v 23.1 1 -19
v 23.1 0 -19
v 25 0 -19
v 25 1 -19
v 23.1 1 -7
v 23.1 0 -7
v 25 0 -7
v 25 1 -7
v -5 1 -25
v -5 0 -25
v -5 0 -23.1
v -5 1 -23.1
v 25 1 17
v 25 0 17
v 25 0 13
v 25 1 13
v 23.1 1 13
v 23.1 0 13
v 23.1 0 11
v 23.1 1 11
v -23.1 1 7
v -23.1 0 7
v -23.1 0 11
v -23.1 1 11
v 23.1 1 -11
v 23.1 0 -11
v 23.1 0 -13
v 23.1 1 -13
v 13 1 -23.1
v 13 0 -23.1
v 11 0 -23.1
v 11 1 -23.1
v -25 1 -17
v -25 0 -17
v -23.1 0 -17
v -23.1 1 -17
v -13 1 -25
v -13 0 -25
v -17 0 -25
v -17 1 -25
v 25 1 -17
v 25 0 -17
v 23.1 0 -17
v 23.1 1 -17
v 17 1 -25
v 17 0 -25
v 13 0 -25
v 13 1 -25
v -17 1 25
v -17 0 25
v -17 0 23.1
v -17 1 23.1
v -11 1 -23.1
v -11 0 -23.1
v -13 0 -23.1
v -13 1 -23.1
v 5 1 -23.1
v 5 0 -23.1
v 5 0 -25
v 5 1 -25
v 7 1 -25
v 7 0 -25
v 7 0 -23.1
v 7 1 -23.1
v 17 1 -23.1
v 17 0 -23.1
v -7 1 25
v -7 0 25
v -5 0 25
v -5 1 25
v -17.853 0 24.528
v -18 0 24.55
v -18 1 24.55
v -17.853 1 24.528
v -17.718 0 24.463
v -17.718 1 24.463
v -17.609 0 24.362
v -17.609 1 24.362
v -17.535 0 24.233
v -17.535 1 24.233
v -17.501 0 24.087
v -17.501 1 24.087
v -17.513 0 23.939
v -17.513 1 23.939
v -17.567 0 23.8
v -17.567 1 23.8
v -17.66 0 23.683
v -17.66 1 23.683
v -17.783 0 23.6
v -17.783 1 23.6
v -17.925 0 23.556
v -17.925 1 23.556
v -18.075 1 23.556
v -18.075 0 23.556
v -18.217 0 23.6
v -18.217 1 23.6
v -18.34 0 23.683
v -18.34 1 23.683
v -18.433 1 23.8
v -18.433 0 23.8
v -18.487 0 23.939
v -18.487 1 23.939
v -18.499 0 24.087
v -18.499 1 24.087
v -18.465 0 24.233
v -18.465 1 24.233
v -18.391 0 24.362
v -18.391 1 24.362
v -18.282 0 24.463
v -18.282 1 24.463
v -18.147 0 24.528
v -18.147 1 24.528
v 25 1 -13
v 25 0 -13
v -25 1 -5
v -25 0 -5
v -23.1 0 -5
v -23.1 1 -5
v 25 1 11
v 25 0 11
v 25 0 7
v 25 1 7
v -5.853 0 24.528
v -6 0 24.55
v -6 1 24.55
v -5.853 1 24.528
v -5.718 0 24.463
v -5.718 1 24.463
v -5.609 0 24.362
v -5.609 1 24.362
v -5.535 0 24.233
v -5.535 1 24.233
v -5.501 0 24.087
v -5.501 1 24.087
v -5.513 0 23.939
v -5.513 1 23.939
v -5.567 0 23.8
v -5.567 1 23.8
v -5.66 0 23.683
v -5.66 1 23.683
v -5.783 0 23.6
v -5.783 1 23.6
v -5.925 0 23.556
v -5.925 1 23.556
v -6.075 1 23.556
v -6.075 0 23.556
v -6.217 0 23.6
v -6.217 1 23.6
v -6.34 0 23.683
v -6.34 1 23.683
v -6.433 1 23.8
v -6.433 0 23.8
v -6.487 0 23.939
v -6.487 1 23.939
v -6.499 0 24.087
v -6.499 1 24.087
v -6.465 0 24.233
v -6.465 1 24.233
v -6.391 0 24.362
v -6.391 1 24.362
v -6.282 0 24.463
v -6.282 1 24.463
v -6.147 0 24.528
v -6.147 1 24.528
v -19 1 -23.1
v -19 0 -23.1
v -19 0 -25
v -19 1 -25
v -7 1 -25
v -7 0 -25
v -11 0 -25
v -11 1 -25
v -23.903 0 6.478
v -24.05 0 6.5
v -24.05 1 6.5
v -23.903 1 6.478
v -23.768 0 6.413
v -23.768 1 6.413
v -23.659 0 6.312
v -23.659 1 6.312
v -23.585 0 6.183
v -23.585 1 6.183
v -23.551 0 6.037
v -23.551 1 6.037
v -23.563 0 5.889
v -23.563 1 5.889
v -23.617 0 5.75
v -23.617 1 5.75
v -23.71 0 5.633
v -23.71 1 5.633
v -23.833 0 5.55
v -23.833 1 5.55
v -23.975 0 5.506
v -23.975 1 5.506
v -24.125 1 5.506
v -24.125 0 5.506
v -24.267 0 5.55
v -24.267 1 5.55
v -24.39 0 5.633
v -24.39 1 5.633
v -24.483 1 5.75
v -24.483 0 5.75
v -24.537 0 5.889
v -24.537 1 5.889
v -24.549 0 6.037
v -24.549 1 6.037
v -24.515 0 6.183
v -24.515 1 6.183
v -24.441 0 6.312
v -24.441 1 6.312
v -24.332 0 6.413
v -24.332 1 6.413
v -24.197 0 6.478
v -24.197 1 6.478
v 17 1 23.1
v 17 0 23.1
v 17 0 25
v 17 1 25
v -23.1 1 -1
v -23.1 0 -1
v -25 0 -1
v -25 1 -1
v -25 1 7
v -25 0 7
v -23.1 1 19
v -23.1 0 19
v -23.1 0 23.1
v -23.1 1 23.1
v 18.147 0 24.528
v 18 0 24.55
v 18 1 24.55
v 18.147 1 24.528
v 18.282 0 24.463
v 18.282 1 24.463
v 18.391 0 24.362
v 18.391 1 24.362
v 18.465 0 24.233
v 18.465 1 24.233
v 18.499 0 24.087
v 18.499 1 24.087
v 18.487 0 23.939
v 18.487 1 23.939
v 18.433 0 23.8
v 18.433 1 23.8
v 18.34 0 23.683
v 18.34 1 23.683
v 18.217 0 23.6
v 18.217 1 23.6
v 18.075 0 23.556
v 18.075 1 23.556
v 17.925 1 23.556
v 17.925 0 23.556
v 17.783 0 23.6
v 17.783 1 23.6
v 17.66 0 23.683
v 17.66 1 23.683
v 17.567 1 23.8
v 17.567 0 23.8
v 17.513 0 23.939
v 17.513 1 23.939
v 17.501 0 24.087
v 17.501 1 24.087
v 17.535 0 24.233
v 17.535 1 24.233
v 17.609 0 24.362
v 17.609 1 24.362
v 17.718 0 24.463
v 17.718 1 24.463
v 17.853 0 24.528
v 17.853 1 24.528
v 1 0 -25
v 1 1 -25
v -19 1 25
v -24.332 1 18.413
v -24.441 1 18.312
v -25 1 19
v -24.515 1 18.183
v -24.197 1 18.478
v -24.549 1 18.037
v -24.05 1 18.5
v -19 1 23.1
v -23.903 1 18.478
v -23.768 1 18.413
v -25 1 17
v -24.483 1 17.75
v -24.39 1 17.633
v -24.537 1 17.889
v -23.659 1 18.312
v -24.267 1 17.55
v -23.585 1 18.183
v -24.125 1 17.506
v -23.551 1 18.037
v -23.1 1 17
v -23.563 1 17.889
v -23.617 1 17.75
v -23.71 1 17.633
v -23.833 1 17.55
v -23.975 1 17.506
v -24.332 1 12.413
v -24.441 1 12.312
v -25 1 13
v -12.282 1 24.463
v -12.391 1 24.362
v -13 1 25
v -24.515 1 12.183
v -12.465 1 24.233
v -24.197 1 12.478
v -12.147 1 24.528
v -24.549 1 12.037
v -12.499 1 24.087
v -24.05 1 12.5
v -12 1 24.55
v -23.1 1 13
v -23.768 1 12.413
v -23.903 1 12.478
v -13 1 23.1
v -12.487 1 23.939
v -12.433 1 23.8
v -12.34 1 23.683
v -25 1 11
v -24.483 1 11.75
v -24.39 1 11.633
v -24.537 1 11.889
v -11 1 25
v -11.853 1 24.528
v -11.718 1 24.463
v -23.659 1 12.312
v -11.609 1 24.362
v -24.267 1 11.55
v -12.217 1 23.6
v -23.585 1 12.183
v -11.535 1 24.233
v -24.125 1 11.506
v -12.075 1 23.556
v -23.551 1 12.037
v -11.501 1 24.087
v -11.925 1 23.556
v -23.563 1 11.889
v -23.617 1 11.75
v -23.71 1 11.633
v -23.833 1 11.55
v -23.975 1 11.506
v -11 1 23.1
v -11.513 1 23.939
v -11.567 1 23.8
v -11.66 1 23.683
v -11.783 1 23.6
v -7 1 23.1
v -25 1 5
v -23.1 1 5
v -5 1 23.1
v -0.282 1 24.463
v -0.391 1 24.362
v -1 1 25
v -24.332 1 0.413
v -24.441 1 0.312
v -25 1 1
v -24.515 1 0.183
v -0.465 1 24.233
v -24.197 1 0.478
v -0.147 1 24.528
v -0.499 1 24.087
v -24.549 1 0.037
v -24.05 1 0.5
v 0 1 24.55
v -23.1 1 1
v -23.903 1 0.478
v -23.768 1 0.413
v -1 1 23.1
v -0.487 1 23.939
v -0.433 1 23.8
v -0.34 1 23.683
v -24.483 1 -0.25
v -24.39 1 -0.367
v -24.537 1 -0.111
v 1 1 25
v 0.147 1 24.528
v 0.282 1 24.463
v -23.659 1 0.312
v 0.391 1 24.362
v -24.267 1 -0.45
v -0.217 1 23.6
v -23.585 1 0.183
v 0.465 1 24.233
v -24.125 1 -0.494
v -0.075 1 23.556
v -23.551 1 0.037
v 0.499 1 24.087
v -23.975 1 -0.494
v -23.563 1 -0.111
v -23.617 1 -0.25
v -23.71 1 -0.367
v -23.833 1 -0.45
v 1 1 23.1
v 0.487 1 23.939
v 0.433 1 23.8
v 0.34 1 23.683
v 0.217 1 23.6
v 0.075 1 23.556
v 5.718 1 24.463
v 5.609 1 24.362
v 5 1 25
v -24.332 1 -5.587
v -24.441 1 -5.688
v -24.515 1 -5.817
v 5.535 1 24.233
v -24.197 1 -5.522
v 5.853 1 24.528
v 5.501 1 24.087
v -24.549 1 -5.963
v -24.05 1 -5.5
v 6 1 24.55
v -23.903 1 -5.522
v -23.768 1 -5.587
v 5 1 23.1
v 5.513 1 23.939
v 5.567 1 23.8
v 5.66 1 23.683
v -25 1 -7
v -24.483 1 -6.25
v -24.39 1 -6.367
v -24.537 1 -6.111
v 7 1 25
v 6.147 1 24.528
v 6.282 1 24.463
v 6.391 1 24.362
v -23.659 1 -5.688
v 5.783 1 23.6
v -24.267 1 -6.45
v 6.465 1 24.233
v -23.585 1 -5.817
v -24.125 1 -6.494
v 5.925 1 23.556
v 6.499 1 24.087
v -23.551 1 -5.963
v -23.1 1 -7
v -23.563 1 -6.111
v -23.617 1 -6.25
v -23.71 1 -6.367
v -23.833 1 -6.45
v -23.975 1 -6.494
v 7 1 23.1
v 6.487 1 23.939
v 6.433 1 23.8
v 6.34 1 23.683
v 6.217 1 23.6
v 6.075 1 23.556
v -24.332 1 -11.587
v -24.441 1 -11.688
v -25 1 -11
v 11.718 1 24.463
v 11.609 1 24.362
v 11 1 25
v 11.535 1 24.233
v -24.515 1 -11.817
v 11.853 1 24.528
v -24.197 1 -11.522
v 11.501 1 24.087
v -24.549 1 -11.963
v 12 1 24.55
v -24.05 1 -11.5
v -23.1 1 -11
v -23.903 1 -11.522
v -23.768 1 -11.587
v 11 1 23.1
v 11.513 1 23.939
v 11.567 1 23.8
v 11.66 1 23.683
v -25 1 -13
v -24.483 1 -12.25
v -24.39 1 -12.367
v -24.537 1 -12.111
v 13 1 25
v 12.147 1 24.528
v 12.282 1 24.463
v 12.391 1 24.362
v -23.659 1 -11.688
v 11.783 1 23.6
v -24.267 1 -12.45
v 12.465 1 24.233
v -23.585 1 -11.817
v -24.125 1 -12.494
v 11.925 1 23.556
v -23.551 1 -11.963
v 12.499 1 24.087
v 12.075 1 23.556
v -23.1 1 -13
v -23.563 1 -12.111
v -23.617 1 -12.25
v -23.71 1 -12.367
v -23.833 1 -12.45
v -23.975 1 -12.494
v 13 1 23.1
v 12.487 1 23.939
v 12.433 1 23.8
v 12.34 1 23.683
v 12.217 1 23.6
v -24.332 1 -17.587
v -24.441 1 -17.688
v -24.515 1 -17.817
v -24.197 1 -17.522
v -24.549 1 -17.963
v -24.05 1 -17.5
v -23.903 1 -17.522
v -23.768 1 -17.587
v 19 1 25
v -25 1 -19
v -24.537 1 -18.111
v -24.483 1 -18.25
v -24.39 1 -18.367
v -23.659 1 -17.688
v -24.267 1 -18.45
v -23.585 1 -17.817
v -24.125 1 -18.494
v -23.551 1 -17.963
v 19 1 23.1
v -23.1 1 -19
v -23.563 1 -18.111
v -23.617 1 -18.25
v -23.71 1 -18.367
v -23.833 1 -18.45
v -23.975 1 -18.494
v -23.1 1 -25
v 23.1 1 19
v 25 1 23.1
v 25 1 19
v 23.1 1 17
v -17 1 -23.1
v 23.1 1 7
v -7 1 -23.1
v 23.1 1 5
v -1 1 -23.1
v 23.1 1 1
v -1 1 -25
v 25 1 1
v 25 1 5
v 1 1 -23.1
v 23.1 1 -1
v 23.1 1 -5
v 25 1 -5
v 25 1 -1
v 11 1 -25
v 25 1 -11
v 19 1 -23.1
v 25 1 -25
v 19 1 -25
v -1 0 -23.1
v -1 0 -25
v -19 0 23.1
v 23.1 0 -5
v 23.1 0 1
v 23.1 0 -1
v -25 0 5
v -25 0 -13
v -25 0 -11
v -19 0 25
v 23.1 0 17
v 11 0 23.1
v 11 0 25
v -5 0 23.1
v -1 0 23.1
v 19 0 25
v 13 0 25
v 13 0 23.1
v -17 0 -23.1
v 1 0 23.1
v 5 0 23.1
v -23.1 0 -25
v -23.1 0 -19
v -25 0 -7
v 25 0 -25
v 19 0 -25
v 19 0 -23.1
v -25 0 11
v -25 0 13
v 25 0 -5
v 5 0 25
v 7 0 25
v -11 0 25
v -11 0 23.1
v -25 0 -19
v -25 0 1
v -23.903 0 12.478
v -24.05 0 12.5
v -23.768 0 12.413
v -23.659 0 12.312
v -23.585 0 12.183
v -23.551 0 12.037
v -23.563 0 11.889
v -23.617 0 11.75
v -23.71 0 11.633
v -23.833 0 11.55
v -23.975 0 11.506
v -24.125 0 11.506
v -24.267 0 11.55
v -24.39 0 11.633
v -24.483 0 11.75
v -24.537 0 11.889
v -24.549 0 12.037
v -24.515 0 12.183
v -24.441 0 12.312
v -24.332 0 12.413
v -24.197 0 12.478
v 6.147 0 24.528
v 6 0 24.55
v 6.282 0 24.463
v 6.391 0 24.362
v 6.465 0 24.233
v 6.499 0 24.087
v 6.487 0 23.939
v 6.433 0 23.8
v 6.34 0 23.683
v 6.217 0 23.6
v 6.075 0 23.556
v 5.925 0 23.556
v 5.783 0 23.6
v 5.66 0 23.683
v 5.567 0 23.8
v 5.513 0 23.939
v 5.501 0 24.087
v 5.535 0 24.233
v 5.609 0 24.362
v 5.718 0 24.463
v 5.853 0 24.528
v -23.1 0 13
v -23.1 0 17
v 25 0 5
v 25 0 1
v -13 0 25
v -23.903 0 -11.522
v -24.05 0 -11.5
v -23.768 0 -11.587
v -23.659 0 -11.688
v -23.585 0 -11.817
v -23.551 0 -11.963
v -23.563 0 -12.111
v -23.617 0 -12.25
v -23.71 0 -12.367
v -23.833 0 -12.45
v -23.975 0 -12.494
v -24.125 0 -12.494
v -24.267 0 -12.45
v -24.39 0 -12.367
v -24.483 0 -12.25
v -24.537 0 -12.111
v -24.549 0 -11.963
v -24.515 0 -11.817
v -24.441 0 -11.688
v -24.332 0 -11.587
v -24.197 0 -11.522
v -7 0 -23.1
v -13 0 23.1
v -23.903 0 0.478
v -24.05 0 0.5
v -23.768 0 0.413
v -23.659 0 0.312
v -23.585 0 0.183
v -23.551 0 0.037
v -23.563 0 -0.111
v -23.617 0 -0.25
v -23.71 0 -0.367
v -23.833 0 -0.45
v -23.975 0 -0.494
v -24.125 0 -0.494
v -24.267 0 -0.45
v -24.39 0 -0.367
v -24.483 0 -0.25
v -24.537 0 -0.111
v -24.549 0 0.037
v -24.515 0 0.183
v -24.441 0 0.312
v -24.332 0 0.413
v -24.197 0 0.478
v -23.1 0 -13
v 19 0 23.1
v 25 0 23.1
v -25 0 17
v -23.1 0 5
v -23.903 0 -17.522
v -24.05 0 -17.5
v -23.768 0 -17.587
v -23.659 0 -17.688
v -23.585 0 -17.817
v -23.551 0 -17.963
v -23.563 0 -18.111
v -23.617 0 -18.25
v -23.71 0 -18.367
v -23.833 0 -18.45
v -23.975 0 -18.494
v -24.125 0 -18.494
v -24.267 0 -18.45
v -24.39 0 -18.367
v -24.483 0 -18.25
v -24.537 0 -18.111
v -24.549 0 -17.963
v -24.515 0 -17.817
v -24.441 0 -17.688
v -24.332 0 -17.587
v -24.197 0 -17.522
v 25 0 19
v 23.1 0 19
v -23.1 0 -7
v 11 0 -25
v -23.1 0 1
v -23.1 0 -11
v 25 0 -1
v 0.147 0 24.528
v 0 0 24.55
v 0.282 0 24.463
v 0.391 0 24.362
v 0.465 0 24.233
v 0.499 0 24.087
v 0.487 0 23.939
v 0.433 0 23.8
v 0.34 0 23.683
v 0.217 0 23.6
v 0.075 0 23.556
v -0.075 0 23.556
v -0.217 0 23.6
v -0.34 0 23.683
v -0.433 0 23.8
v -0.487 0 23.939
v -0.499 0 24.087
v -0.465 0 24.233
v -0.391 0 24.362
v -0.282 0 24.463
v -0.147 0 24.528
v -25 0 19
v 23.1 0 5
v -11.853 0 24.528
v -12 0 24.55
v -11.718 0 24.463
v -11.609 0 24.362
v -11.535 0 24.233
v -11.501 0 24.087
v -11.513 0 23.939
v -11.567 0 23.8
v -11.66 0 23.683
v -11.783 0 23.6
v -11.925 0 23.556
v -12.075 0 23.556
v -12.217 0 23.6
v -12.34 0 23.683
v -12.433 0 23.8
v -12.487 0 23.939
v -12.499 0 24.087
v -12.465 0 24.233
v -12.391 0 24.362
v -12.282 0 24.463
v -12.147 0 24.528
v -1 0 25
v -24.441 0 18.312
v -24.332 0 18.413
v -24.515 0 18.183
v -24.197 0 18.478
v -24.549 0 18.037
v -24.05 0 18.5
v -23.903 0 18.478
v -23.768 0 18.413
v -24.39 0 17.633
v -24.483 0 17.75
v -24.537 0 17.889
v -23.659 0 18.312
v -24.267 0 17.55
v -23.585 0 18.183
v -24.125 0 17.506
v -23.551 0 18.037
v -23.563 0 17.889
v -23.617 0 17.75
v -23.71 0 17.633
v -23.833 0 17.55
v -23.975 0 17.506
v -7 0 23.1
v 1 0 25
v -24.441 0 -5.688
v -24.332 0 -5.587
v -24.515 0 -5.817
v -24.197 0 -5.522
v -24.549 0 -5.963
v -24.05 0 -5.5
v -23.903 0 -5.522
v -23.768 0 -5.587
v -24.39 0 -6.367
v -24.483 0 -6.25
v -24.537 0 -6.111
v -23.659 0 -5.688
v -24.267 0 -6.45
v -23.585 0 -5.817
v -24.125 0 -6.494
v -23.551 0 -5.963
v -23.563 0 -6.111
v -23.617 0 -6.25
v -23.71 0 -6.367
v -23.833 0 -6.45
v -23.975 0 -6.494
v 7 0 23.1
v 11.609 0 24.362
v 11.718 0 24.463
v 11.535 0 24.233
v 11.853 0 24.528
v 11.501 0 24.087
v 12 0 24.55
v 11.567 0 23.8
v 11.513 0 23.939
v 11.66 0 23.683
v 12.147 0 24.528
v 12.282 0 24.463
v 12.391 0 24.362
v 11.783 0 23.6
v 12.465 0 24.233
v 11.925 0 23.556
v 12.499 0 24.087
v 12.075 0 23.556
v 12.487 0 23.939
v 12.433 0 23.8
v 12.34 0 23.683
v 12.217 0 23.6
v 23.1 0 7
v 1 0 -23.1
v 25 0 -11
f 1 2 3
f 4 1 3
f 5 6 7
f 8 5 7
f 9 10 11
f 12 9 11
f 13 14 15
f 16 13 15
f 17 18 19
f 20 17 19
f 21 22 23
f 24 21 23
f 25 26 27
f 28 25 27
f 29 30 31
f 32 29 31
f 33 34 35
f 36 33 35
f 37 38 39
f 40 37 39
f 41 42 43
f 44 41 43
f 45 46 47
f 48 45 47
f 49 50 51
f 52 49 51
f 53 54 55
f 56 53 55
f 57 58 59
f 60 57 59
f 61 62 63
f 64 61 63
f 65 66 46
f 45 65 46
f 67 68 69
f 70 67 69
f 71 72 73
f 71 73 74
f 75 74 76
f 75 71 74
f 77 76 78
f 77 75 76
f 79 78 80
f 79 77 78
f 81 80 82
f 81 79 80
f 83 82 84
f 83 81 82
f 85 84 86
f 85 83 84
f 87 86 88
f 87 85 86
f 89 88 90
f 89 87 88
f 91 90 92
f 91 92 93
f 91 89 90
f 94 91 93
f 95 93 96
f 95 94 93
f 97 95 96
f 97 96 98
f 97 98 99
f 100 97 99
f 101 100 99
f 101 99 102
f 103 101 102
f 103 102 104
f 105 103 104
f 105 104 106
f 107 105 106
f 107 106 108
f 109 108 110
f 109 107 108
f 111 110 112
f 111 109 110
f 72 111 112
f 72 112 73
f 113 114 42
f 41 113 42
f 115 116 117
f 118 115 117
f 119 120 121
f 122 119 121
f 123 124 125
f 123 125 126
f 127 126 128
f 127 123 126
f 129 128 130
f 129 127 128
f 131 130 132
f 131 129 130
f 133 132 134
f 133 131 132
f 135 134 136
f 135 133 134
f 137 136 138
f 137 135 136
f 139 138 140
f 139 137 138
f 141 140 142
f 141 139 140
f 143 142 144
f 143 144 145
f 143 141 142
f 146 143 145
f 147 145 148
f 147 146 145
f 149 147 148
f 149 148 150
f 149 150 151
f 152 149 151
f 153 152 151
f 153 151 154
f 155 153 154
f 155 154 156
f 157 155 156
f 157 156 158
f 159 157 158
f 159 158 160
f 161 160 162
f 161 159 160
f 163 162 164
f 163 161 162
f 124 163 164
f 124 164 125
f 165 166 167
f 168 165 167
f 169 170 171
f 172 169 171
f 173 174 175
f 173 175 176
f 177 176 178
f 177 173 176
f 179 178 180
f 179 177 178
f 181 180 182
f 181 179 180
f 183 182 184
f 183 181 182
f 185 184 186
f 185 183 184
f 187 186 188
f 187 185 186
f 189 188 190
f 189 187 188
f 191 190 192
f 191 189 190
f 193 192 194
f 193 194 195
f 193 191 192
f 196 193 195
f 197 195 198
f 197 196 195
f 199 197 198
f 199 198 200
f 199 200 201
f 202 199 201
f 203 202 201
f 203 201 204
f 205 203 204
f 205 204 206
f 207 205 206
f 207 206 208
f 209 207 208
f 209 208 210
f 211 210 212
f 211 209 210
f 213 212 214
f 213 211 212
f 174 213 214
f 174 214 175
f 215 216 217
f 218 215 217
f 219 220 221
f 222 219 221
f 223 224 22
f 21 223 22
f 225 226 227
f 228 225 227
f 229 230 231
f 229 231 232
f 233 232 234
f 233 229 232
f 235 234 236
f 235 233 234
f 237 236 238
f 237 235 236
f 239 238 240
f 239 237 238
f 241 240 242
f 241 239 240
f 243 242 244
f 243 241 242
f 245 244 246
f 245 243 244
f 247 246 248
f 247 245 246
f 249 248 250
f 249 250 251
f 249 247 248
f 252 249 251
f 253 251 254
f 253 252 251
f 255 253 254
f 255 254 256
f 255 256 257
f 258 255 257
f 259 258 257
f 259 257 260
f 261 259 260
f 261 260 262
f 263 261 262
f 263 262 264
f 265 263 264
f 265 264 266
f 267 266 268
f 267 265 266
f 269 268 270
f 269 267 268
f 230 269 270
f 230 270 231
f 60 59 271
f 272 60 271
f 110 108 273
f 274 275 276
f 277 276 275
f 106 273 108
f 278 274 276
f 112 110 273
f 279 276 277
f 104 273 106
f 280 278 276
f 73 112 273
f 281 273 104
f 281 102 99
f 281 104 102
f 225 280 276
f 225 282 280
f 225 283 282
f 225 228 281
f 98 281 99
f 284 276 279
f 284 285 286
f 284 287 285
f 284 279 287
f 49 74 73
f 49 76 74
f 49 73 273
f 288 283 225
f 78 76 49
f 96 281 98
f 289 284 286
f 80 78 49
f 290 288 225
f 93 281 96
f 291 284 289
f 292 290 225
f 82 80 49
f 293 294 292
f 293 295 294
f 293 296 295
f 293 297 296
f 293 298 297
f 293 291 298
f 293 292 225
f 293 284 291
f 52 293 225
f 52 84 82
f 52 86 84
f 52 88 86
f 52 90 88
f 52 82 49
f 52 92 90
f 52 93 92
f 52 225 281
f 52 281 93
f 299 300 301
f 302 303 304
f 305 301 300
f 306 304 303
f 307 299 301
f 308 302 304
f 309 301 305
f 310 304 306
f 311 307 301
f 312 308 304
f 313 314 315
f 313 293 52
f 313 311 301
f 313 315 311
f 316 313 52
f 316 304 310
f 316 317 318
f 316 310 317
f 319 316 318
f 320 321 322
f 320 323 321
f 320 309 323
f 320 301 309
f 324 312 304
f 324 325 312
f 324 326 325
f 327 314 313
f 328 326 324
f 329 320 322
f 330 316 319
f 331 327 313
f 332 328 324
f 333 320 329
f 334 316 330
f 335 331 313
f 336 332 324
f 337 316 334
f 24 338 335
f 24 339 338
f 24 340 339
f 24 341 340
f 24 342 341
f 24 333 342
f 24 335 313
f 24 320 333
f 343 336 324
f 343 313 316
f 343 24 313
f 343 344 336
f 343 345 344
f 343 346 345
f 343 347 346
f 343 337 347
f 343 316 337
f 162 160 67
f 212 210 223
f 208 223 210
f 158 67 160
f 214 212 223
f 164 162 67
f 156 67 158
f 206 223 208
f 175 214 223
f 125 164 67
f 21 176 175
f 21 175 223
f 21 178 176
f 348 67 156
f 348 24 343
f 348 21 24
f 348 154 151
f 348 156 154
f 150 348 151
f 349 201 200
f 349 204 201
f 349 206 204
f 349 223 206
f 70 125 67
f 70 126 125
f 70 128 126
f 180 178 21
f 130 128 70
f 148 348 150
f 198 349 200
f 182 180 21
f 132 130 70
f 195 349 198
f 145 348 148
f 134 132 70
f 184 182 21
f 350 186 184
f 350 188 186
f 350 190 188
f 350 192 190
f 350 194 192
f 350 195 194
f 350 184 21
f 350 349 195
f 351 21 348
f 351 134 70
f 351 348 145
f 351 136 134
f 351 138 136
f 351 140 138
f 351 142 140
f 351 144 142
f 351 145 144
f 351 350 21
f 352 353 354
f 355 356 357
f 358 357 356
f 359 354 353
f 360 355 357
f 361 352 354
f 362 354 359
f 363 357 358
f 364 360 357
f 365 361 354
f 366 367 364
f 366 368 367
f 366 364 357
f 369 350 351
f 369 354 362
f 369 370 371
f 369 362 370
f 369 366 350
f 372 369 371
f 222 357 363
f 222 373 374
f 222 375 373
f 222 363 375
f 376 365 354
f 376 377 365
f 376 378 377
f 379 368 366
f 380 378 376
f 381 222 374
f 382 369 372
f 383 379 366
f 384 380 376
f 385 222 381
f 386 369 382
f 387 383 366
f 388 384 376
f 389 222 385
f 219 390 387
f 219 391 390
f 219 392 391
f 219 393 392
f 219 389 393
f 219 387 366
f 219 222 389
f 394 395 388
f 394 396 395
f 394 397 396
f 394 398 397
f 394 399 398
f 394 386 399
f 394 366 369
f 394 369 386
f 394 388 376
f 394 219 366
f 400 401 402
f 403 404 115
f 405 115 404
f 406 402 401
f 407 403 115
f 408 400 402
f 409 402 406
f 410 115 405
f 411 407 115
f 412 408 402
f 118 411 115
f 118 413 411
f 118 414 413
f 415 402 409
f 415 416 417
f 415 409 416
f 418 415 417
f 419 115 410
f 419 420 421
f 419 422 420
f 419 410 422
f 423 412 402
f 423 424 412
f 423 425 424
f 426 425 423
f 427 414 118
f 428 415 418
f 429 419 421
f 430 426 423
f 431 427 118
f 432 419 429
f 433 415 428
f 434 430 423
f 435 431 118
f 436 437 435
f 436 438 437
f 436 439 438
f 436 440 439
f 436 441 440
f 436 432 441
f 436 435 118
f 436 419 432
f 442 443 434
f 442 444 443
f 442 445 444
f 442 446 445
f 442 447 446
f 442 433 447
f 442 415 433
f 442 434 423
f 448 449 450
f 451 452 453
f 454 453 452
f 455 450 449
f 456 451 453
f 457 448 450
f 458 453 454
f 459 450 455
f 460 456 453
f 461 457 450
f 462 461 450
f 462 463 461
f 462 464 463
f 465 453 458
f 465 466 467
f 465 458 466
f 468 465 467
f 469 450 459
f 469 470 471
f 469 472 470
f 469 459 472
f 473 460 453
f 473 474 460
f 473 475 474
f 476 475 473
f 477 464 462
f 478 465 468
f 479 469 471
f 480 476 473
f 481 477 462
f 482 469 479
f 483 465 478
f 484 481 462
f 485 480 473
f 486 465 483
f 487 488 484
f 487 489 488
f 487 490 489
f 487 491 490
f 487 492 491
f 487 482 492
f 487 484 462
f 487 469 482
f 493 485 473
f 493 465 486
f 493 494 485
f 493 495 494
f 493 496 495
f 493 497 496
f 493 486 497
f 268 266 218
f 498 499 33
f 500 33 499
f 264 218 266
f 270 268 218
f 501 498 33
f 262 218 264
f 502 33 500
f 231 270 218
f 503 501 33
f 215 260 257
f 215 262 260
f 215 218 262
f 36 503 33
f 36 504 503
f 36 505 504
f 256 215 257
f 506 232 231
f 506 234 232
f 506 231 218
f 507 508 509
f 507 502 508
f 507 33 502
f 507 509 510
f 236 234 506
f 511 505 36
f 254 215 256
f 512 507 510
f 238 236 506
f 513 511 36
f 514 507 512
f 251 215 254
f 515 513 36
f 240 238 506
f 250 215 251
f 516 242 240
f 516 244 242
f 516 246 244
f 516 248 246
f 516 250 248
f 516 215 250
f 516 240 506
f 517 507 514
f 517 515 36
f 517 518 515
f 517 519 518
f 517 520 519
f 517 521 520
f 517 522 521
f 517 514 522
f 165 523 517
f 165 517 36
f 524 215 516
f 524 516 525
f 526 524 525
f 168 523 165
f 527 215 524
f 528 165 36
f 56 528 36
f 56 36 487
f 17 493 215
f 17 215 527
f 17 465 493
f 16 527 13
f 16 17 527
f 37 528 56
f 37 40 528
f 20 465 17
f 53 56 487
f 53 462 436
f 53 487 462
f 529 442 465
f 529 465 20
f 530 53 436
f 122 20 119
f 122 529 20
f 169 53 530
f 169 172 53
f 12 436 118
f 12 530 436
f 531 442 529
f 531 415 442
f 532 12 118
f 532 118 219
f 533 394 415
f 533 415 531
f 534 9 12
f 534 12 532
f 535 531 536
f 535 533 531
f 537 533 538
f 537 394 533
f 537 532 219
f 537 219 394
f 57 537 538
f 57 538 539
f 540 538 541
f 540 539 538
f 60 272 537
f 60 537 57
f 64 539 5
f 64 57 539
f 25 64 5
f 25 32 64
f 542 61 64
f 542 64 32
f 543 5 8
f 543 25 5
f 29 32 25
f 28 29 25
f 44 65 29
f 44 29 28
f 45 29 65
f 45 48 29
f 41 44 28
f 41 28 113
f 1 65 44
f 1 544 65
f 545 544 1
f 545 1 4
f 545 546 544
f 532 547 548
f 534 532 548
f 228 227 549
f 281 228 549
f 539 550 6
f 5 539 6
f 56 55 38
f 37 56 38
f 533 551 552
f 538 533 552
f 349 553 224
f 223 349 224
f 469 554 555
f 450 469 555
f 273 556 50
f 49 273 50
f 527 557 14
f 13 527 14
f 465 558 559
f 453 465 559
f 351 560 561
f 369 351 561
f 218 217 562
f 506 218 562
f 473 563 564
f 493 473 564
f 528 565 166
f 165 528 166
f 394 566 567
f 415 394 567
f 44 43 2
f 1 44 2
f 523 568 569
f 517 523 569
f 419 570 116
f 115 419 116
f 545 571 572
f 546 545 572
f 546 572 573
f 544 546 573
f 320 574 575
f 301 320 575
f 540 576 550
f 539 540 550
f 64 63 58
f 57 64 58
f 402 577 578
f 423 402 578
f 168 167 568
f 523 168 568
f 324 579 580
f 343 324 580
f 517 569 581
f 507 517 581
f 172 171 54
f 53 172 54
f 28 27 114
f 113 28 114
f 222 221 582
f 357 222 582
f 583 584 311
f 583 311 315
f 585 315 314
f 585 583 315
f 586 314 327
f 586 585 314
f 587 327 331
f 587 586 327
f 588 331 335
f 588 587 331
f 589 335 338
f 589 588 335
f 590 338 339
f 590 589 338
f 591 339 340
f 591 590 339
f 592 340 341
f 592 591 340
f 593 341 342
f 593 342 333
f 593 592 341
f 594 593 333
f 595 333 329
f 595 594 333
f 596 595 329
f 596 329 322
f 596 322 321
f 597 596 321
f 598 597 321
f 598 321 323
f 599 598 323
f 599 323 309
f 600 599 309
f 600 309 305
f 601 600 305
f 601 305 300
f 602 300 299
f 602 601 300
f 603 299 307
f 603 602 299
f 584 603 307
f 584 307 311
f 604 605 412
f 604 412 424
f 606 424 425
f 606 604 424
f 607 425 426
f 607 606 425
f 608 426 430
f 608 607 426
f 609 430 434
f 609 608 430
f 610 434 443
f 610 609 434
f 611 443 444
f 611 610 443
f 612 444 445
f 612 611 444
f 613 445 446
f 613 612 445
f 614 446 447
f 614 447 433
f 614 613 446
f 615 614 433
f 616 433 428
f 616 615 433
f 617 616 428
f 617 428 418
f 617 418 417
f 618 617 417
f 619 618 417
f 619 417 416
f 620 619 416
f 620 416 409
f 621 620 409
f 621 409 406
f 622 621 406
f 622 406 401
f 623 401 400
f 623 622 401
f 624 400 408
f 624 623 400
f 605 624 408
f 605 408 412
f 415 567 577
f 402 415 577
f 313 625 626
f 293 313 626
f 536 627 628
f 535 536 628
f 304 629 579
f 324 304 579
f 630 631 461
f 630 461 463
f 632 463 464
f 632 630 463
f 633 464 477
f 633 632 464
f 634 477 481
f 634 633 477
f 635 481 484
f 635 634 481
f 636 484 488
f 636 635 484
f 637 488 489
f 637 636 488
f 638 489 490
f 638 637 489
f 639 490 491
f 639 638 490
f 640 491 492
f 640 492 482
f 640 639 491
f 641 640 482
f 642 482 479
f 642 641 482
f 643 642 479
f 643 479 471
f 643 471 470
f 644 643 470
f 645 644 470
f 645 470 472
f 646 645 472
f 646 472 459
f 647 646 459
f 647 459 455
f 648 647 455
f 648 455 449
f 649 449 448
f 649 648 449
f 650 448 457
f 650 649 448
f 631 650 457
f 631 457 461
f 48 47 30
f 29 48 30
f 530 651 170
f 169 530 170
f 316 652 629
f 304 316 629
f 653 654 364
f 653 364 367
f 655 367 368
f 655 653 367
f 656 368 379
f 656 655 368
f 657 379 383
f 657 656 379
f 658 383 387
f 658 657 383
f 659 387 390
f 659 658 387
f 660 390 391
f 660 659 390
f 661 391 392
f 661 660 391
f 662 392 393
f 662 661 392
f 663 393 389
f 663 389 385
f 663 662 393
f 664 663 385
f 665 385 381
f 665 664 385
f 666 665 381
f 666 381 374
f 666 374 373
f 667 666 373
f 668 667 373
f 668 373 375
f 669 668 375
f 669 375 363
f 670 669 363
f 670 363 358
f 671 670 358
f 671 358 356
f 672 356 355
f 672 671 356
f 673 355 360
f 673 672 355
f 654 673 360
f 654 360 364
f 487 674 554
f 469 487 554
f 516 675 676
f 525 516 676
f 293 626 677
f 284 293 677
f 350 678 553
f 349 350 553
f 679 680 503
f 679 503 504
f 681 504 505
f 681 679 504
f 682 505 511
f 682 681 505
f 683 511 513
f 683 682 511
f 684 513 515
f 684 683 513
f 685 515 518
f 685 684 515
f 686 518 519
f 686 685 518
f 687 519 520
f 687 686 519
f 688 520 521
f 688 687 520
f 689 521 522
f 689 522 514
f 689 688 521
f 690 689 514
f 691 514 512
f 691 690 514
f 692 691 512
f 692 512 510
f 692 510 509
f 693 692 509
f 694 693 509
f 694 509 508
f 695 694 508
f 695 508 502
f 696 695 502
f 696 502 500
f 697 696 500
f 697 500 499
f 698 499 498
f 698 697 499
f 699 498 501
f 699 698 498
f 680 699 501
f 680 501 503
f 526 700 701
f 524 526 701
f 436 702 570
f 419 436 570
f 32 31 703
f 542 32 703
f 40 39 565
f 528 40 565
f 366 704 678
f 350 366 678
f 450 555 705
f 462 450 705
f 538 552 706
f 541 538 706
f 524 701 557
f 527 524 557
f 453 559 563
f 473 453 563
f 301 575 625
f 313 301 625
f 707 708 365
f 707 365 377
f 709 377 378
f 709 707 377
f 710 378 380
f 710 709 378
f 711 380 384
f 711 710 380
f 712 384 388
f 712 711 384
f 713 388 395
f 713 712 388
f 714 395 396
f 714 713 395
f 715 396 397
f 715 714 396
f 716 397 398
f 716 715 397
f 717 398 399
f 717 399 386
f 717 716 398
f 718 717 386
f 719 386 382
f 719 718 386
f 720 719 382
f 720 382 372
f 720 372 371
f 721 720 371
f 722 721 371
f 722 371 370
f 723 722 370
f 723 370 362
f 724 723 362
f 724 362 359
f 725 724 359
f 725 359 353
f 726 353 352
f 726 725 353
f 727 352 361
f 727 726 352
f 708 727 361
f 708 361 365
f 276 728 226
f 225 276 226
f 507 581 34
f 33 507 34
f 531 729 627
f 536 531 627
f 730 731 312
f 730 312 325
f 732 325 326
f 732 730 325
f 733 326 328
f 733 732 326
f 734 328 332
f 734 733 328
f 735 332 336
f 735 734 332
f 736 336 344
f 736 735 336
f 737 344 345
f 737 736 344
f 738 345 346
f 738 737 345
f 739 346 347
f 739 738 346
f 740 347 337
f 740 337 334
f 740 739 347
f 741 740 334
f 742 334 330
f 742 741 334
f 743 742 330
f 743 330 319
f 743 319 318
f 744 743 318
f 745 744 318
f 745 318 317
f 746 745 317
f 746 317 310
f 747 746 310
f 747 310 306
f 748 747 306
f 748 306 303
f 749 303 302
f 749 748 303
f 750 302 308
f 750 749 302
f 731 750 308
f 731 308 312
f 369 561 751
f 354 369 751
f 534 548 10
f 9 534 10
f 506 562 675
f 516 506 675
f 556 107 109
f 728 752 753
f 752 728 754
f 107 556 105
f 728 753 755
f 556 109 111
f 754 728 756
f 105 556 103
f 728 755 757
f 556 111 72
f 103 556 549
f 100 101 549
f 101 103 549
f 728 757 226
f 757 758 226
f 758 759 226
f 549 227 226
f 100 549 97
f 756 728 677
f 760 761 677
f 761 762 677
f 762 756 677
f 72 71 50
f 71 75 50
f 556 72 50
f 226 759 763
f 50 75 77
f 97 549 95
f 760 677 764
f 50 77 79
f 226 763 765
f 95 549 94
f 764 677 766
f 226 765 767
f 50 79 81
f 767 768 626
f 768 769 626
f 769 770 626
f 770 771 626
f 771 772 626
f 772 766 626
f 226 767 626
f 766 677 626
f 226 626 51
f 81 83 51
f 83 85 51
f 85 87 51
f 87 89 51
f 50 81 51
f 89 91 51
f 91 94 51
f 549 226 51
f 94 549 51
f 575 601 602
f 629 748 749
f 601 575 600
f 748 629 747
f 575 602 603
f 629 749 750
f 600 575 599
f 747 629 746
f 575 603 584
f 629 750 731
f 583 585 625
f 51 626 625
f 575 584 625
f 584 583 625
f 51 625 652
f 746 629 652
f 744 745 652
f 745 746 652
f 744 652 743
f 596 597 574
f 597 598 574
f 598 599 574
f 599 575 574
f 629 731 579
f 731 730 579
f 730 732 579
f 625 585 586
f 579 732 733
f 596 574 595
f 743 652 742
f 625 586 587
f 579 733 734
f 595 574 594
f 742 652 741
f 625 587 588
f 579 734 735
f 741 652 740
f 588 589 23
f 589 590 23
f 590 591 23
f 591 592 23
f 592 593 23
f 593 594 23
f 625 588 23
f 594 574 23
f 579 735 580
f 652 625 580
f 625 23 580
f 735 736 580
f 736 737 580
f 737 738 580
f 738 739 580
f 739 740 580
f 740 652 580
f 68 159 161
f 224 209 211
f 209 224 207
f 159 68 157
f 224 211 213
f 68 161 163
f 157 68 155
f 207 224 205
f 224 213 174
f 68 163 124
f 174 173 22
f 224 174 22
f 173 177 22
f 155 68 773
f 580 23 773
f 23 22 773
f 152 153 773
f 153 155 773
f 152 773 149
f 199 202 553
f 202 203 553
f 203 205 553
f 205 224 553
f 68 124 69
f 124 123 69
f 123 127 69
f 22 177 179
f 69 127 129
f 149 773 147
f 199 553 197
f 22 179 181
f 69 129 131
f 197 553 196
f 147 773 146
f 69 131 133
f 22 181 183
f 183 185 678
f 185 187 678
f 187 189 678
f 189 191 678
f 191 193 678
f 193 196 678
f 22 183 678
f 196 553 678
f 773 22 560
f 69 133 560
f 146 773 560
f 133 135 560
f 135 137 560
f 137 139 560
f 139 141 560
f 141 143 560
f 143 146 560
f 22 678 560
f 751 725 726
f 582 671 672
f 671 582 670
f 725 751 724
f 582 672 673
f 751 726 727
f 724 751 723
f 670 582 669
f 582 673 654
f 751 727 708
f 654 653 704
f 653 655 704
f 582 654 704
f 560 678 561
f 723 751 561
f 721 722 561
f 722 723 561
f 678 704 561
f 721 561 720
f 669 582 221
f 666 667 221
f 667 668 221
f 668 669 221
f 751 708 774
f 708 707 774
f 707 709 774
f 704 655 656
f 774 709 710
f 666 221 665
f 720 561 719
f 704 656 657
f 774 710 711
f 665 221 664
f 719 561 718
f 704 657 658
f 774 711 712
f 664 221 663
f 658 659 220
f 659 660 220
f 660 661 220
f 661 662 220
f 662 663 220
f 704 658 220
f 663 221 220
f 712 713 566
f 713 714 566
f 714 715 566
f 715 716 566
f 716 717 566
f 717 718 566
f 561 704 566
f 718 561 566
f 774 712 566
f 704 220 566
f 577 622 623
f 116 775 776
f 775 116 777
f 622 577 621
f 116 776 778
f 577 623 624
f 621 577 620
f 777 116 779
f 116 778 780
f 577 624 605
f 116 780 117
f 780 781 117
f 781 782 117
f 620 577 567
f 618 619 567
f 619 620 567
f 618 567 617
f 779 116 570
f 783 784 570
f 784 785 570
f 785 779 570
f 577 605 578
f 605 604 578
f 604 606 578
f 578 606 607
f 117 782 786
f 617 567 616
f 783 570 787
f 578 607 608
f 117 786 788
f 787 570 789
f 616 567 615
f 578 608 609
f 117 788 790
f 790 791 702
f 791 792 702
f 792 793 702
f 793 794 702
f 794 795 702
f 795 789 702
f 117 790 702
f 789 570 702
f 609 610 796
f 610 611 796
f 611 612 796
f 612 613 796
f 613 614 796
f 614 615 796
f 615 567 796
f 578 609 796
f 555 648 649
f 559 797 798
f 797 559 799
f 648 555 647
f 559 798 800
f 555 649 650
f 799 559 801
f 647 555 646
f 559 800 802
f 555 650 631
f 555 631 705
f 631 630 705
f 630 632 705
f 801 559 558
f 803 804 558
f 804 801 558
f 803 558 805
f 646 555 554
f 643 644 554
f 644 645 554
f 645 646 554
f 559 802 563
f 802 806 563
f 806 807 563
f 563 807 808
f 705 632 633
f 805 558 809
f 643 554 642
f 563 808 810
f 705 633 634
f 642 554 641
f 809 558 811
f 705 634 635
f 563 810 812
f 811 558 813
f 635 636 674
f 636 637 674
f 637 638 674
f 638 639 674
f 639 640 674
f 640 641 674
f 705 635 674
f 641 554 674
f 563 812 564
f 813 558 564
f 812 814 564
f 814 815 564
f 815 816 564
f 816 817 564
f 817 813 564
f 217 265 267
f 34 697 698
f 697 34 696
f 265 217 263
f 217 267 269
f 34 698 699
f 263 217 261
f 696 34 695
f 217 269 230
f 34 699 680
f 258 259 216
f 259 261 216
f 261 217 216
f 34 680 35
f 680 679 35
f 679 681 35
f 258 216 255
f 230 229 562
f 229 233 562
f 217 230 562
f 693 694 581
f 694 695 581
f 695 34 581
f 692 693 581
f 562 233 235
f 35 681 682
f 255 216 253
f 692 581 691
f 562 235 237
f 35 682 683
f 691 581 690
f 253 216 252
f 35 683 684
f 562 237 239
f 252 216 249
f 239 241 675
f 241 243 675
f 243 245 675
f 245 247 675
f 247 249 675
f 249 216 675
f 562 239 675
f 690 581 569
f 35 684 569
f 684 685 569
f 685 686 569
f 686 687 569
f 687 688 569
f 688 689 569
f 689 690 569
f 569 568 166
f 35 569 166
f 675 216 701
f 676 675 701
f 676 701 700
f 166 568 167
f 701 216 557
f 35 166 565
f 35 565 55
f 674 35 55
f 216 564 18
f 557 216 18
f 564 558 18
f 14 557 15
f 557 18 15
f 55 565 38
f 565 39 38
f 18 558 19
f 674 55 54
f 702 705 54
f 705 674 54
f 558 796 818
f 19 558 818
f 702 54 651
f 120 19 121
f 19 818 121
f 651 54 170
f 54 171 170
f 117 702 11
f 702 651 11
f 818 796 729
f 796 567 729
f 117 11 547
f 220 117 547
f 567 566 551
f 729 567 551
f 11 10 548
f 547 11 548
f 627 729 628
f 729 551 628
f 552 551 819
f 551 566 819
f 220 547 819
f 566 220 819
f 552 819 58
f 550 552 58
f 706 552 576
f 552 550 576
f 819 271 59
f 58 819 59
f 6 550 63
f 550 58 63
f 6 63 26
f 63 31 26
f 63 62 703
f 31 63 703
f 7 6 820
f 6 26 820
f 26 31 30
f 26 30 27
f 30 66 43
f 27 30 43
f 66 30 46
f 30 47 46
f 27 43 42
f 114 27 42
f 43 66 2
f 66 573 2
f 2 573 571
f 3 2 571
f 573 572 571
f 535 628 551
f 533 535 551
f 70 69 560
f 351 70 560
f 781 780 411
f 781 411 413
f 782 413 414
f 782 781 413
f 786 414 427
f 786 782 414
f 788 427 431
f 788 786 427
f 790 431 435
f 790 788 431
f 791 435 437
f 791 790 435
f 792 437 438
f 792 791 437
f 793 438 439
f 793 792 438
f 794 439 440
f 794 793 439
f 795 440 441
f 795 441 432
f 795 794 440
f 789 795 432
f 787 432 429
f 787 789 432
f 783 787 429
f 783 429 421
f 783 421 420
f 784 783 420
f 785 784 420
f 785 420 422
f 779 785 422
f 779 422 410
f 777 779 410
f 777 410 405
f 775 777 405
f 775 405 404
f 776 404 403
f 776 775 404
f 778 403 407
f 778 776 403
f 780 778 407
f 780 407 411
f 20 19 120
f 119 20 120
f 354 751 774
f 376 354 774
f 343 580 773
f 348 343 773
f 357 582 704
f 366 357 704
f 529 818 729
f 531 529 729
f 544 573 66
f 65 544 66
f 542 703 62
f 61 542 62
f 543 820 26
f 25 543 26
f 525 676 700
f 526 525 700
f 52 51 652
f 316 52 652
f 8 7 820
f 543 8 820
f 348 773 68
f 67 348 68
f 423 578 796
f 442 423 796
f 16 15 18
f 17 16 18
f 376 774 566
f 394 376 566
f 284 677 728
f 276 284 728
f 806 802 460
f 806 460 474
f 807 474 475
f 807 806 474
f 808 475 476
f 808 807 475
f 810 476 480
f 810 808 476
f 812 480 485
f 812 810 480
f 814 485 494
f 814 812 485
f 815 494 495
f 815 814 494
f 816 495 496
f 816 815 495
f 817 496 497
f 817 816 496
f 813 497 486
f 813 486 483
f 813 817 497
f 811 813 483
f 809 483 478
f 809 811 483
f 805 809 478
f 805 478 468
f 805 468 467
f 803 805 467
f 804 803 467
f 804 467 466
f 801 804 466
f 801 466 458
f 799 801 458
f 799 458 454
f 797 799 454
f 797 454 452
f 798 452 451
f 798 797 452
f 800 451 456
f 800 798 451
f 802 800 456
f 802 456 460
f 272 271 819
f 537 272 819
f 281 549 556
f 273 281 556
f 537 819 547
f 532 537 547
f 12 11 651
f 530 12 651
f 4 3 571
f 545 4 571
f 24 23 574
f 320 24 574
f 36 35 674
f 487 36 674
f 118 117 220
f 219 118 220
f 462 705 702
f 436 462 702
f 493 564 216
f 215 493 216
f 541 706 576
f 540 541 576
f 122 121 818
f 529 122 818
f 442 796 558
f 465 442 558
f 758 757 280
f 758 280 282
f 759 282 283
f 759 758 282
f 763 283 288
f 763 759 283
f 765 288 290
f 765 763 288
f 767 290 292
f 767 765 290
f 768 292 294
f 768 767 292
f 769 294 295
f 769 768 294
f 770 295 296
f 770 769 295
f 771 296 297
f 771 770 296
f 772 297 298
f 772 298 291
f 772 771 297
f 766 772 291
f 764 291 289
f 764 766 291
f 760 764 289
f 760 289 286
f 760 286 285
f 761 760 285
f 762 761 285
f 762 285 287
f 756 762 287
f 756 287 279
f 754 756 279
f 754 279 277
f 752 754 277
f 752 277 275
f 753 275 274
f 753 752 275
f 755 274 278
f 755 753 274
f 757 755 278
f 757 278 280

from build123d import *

# Parameters (mm, degrees)
SKETCH_1_R      = 0.5
EXTRUDE_2_DEPTH = 1


with BuildPart() as part:
    # Эскиз1 → Бобышка-Вытянуть2 (new body)
    with BuildSketch(Plane(origin=(0, 0, 0), x_dir=(1, 0, 0), z_dir=(0, 1, 0))):
        Polygon((25, -23.1), (25, -19), (23.1, -19), (23.1, -17), (25, -17), (25, -13), (23.1, -13), (23.1, -11), (25, -11), (25, -7), (23.1, -7), (23.1, -5), (25, -5), (25, -1), (23.1, -1), (23.1, 1), (25, 1), (25, 5), (23.1, 5), (23.1, 7), (25, 7), (25, 11), (23.1, 11), (23.1, 13), (25, 13), (25, 17), (23.1, 17), (23.1, 19), (25, 19), (25, 25), (19, 25), (19, 23.1), (17, 23.1), (17, 25), (13, 25), (13, 23.1), (11, 23.1), (11, 25), (7, 25), (7, 23.1), (5, 23.1), (5, 25), (1, 25), (1, 23.1), (-1, 23.1), (-1, 25), (-5, 25), (-5, 23.1), (-7, 23.1), (-7, 25), (-11, 25), (-11, 23.1), (-13, 23.1), (-13, 25), (-17, 25), (-17, 23.1), (-19, 23.1), (-19, 25), (-23.1, 25), (-23.1, 19), (-25, 19), (-25, 17), (-23.1, 17), (-23.1, 13), (-25, 13), (-25, 11), (-23.1, 11), (-23.1, 7), (-25, 7), (-25, 5), (-23.1, 5), (-23.1, 1), (-25, 1), (-25, -1), (-23.1, -1), (-23.1, -5), (-25, -5), (-25, -7), (-23.1, -7), (-23.1, -11), (-25, -11), (-25, -13), (-23.1, -13), (-23.1, -17), (-25, -17), (-25, -19), (-23.1, -19), (-23.1, -23.1), (-19, -23.1), (-19, -25), (-17, -25), (-17, -23.1), (-13, -23.1), (-13, -25), (-11, -25), (-11, -23.1), (-7, -23.1), (-7, -25), (-5, -25), (-5, -23.1), (-1, -23.1), (-1, -25), (1, -25), (1, -23.1), (5, -23.1), (5, -25), (7, -25), (7, -23.1), (11, -23.1), (11, -25), (13, -25), (13, -23.1), (17, -23.1), (17, -25), (19, -25), (19, -23.1), align=None)
        with Locations(Location((18, -24.05, 0), (0, 0, 270))):
            Circle(SKETCH_1_R, mode=Mode.SUBTRACT)
        with Locations(Location((12, -24.05, 0), (0, 0, 270))):
            Circle(SKETCH_1_R, mode=Mode.SUBTRACT)
        with Locations(Location((6, -24.05, 0), (0, 0, 270))):
            Circle(SKETCH_1_R, mode=Mode.SUBTRACT)
        with Locations(Location((0, -24.05, 0), (0, 0, 270))):
            Circle(SKETCH_1_R, mode=Mode.SUBTRACT)
        with Locations(Location((-6, -24.05, 0), (0, 0, 270))):
            Circle(SKETCH_1_R, mode=Mode.SUBTRACT)
        with Locations(Location((-12, -24.05, 0), (0, 0, 270))):
            Circle(SKETCH_1_R, mode=Mode.SUBTRACT)
        with Locations(Location((-18, -24.05, 0), (0, 0, 270))):
            Circle(SKETCH_1_R, mode=Mode.SUBTRACT)
        with Locations(Location((-24.05, -18, 0), (0, 0, 270))):
            Circle(SKETCH_1_R, mode=Mode.SUBTRACT)
        with Locations(Location((-24.05, -12, 0), (0, 0, 270))):
            Circle(SKETCH_1_R, mode=Mode.SUBTRACT)
        with Locations(Location((-24.05, -6, 0), (0, 0, 270))):
            Circle(SKETCH_1_R, mode=Mode.SUBTRACT)
        with Locations(Location((-24.05, 0, 0), (0, 0, 270))):
            Circle(SKETCH_1_R, mode=Mode.SUBTRACT)
        with Locations(Location((-24.05, 6, 0), (0, 0, 270))):
            Circle(SKETCH_1_R, mode=Mode.SUBTRACT)
        with Locations(Location((-24.05, 12, 0), (0, 0, 270))):
            Circle(SKETCH_1_R, mode=Mode.SUBTRACT)
        with Locations(Location((-24.05, 18, 0), (0, 0, 270))):
            Circle(SKETCH_1_R, mode=Mode.SUBTRACT)
    extrude(amount=EXTRUDE_2_DEPTH)


solid = part.part
